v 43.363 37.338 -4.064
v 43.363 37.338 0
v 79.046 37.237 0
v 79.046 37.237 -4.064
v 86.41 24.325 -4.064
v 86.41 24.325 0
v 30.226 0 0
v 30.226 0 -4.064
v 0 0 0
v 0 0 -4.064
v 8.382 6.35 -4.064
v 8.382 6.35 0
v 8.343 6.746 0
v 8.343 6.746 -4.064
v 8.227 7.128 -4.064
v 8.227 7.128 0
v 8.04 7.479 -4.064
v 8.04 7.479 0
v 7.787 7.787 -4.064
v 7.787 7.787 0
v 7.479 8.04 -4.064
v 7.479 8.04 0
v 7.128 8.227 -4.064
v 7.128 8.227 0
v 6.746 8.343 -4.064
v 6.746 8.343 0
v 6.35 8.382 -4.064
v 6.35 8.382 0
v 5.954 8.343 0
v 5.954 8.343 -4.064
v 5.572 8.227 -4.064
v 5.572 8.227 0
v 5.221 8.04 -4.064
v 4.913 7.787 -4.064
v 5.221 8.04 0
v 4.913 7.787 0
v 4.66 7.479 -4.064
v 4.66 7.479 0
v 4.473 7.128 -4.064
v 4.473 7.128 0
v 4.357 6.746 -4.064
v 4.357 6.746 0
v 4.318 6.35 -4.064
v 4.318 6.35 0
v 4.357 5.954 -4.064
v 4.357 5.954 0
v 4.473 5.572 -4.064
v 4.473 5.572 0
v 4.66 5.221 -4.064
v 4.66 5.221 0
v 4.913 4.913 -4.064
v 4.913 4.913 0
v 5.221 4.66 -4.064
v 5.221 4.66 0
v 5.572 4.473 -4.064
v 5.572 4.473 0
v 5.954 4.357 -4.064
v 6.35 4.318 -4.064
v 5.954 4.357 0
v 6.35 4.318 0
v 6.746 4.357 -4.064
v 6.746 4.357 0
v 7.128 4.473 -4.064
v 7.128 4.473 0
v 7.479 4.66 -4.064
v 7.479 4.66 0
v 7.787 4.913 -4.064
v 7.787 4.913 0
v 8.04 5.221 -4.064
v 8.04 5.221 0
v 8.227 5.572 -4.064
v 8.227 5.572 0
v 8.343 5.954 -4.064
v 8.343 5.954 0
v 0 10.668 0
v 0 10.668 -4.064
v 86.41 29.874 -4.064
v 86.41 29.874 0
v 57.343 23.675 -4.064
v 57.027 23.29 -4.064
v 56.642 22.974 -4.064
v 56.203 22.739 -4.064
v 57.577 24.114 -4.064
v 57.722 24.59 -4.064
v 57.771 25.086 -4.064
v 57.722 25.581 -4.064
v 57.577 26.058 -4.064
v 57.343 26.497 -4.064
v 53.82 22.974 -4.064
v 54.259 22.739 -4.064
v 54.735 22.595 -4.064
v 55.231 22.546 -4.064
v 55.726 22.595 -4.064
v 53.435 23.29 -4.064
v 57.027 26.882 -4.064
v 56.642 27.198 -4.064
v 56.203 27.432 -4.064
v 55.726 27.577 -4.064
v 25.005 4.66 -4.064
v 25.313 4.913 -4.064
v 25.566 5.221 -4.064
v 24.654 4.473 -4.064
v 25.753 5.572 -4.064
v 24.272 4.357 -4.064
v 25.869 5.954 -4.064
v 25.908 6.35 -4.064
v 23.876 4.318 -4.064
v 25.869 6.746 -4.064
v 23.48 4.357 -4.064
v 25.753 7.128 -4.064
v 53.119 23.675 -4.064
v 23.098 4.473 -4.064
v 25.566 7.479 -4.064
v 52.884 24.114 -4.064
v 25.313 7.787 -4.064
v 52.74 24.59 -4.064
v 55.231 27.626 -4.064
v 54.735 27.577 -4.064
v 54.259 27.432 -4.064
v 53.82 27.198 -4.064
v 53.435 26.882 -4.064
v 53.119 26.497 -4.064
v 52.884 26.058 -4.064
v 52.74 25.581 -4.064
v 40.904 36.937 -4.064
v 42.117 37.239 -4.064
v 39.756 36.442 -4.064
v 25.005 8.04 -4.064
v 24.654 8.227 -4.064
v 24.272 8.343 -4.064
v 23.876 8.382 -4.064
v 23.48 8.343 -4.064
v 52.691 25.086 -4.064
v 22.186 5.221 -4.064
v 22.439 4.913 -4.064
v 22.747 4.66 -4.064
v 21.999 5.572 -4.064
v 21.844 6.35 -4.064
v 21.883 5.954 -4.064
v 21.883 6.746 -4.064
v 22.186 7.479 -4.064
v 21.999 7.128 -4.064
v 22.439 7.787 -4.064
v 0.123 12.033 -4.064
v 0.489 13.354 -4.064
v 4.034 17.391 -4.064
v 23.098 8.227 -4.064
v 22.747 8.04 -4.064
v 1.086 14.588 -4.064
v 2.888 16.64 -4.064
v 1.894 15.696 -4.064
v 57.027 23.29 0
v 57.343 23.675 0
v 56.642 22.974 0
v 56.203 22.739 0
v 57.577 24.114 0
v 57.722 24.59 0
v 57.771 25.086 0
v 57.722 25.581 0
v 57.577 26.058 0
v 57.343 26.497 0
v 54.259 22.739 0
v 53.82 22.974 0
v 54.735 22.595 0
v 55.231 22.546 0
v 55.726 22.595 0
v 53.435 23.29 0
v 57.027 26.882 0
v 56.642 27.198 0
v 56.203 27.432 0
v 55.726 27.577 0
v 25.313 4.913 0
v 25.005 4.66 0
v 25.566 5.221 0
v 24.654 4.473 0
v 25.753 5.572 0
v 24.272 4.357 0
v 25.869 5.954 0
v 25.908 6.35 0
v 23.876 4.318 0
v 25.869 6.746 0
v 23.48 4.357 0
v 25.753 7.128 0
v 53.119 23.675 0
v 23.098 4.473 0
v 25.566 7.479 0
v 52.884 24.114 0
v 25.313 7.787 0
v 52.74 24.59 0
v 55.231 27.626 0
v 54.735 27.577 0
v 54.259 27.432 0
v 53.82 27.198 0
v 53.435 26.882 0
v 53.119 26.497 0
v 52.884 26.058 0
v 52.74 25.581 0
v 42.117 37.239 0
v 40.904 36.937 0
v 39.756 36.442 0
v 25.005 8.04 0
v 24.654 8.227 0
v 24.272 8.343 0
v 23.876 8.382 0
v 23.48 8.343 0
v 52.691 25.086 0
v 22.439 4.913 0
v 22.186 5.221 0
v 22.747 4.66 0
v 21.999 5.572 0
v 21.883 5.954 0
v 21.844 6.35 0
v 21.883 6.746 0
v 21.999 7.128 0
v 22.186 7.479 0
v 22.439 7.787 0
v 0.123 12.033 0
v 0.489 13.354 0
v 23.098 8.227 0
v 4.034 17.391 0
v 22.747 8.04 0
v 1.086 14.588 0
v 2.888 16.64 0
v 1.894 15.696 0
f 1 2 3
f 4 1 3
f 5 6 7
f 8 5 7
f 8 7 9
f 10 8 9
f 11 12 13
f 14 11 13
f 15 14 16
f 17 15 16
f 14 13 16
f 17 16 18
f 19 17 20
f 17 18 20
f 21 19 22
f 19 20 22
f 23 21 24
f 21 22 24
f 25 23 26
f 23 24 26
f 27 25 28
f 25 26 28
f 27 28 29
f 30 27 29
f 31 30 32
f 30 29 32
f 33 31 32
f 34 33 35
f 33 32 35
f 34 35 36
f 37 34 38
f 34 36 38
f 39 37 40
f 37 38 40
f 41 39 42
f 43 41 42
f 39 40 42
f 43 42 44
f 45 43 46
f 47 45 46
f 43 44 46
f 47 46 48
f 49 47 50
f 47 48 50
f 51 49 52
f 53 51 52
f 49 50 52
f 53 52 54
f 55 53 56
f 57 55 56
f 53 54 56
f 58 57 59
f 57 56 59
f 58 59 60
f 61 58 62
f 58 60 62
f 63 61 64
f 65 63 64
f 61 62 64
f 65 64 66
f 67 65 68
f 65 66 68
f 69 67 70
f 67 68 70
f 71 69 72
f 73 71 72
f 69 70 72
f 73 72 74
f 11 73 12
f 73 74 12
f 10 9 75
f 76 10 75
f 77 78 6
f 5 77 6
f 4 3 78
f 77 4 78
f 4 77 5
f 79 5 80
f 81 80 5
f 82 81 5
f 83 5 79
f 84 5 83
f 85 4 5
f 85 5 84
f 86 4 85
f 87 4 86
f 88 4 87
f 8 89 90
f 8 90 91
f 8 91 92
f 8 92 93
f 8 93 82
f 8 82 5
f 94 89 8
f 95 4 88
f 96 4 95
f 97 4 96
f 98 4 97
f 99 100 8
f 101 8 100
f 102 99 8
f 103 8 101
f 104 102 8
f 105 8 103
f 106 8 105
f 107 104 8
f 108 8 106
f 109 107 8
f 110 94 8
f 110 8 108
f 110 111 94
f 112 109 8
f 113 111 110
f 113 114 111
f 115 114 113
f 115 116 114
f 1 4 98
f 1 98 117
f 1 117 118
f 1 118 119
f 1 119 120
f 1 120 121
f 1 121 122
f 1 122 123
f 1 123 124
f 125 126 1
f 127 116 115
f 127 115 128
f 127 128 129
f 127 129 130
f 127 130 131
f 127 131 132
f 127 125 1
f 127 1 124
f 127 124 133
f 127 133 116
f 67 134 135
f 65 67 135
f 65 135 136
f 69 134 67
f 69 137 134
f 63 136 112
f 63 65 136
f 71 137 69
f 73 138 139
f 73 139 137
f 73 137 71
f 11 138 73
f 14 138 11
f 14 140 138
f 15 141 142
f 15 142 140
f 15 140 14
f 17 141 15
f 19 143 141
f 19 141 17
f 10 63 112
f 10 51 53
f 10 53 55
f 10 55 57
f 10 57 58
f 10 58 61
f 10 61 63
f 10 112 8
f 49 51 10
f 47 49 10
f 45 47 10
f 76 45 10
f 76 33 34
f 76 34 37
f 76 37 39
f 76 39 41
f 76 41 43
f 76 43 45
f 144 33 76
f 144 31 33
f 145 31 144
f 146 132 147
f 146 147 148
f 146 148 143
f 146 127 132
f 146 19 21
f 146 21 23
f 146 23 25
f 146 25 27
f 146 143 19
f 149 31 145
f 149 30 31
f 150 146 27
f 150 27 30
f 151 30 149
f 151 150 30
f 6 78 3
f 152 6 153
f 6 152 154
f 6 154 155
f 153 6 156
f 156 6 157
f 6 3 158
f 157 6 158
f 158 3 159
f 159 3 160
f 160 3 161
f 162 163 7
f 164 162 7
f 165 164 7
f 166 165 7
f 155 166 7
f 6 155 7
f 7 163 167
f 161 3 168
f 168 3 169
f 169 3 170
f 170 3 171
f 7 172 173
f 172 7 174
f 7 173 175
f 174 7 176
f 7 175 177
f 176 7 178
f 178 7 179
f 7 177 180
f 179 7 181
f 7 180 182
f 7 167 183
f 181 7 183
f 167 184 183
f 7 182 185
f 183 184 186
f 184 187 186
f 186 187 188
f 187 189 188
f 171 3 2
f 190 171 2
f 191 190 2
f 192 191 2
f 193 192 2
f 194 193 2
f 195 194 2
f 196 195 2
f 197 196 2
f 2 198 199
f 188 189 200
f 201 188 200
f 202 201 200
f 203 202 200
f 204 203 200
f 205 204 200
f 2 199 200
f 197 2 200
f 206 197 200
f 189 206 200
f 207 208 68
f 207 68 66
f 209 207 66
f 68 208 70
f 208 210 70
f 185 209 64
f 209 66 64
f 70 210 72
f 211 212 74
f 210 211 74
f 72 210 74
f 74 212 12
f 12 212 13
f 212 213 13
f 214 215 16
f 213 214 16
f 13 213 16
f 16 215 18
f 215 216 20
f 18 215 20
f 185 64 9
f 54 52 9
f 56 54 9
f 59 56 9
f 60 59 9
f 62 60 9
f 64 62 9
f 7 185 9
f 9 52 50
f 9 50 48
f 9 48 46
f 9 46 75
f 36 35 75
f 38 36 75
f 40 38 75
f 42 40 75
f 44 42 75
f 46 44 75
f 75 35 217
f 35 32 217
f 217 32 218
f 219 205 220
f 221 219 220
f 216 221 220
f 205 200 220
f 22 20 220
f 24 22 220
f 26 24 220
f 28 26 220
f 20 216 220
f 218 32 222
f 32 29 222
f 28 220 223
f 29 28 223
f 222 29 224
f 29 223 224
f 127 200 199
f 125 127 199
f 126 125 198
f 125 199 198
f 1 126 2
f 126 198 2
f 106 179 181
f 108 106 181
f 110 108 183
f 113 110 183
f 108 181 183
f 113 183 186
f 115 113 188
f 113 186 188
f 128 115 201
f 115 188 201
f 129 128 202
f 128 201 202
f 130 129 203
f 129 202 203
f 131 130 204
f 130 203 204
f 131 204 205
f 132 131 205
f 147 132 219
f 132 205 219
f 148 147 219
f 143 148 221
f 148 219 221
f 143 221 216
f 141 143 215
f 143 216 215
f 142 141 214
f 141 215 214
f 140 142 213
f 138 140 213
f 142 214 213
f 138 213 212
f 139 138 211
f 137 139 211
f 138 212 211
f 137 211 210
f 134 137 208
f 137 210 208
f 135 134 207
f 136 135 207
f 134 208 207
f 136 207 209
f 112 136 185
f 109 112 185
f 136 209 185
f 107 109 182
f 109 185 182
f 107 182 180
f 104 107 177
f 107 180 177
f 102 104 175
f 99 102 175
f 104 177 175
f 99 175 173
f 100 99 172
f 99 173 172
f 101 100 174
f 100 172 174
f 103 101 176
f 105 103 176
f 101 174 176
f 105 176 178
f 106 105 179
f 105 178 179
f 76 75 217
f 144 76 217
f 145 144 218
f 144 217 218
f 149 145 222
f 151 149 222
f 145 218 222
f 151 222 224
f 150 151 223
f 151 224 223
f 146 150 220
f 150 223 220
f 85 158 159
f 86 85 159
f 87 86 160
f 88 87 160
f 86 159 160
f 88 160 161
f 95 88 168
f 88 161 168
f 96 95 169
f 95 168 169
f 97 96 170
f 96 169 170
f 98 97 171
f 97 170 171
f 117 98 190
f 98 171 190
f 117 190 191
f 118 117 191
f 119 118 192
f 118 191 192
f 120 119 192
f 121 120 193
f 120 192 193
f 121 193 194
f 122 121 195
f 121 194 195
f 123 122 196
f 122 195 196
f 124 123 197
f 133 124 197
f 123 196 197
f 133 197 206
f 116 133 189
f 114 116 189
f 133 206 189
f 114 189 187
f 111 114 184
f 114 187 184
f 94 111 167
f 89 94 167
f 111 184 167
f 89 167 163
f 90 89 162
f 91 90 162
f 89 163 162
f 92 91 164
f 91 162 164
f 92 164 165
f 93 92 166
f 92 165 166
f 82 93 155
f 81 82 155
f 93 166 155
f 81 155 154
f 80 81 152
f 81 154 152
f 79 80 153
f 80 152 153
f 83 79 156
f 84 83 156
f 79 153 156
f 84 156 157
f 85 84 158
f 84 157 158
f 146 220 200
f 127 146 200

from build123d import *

# Parameters (mm, degrees)
SKETCH1_R           = 2.032
SKETCH1_R_2         = 2.54
BOSS_EXTRUDE1_DEPTH = 4.064


with BuildPart() as part:
    # Sketch1 → Boss-Extrude1 (new body)
    with BuildSketch(Plane.XY):
        with BuildLine():
            Line((0, 0), (0, 10.667831766))
            ThreePointArc((0, 10.667831766), (1.08596755, 14.588395494), (4.034335943, 17.391477598))
            Line((4.034335943, 17.391477598), (39.755950307, 36.44151561))
            ThreePointArc((39.755950307, 36.44151561), (41.504009214, 37.112976763), (43.363043022, 37.337839648))
            Line((43.363043022, 37.337839648), (79.046414123, 37.237491906))
            Line((79.046414123, 37.237491906), (86.410224142, 29.873681887))
            Line((86.410224142, 29.873681887), (86.410224142, 24.325303591))
            Line((86.410224142, 24.325303591), (30.226, 0))
            Line((30.226, 0), (0, 0))
        make_face()
        with Locations((6.35, 6.35)):
            Circle(SKETCH1_R, mode=Mode.SUBTRACT)
        with Locations((23.876, 6.35)):
            Circle(SKETCH1_R, mode=Mode.SUBTRACT)
        with Locations((55.230707363, 25.085785264)):
            Circle(SKETCH1_R_2, mode=Mode.SUBTRACT)
    extrude(amount=-BOSS_EXTRUDE1_DEPTH)


solid = part.part
